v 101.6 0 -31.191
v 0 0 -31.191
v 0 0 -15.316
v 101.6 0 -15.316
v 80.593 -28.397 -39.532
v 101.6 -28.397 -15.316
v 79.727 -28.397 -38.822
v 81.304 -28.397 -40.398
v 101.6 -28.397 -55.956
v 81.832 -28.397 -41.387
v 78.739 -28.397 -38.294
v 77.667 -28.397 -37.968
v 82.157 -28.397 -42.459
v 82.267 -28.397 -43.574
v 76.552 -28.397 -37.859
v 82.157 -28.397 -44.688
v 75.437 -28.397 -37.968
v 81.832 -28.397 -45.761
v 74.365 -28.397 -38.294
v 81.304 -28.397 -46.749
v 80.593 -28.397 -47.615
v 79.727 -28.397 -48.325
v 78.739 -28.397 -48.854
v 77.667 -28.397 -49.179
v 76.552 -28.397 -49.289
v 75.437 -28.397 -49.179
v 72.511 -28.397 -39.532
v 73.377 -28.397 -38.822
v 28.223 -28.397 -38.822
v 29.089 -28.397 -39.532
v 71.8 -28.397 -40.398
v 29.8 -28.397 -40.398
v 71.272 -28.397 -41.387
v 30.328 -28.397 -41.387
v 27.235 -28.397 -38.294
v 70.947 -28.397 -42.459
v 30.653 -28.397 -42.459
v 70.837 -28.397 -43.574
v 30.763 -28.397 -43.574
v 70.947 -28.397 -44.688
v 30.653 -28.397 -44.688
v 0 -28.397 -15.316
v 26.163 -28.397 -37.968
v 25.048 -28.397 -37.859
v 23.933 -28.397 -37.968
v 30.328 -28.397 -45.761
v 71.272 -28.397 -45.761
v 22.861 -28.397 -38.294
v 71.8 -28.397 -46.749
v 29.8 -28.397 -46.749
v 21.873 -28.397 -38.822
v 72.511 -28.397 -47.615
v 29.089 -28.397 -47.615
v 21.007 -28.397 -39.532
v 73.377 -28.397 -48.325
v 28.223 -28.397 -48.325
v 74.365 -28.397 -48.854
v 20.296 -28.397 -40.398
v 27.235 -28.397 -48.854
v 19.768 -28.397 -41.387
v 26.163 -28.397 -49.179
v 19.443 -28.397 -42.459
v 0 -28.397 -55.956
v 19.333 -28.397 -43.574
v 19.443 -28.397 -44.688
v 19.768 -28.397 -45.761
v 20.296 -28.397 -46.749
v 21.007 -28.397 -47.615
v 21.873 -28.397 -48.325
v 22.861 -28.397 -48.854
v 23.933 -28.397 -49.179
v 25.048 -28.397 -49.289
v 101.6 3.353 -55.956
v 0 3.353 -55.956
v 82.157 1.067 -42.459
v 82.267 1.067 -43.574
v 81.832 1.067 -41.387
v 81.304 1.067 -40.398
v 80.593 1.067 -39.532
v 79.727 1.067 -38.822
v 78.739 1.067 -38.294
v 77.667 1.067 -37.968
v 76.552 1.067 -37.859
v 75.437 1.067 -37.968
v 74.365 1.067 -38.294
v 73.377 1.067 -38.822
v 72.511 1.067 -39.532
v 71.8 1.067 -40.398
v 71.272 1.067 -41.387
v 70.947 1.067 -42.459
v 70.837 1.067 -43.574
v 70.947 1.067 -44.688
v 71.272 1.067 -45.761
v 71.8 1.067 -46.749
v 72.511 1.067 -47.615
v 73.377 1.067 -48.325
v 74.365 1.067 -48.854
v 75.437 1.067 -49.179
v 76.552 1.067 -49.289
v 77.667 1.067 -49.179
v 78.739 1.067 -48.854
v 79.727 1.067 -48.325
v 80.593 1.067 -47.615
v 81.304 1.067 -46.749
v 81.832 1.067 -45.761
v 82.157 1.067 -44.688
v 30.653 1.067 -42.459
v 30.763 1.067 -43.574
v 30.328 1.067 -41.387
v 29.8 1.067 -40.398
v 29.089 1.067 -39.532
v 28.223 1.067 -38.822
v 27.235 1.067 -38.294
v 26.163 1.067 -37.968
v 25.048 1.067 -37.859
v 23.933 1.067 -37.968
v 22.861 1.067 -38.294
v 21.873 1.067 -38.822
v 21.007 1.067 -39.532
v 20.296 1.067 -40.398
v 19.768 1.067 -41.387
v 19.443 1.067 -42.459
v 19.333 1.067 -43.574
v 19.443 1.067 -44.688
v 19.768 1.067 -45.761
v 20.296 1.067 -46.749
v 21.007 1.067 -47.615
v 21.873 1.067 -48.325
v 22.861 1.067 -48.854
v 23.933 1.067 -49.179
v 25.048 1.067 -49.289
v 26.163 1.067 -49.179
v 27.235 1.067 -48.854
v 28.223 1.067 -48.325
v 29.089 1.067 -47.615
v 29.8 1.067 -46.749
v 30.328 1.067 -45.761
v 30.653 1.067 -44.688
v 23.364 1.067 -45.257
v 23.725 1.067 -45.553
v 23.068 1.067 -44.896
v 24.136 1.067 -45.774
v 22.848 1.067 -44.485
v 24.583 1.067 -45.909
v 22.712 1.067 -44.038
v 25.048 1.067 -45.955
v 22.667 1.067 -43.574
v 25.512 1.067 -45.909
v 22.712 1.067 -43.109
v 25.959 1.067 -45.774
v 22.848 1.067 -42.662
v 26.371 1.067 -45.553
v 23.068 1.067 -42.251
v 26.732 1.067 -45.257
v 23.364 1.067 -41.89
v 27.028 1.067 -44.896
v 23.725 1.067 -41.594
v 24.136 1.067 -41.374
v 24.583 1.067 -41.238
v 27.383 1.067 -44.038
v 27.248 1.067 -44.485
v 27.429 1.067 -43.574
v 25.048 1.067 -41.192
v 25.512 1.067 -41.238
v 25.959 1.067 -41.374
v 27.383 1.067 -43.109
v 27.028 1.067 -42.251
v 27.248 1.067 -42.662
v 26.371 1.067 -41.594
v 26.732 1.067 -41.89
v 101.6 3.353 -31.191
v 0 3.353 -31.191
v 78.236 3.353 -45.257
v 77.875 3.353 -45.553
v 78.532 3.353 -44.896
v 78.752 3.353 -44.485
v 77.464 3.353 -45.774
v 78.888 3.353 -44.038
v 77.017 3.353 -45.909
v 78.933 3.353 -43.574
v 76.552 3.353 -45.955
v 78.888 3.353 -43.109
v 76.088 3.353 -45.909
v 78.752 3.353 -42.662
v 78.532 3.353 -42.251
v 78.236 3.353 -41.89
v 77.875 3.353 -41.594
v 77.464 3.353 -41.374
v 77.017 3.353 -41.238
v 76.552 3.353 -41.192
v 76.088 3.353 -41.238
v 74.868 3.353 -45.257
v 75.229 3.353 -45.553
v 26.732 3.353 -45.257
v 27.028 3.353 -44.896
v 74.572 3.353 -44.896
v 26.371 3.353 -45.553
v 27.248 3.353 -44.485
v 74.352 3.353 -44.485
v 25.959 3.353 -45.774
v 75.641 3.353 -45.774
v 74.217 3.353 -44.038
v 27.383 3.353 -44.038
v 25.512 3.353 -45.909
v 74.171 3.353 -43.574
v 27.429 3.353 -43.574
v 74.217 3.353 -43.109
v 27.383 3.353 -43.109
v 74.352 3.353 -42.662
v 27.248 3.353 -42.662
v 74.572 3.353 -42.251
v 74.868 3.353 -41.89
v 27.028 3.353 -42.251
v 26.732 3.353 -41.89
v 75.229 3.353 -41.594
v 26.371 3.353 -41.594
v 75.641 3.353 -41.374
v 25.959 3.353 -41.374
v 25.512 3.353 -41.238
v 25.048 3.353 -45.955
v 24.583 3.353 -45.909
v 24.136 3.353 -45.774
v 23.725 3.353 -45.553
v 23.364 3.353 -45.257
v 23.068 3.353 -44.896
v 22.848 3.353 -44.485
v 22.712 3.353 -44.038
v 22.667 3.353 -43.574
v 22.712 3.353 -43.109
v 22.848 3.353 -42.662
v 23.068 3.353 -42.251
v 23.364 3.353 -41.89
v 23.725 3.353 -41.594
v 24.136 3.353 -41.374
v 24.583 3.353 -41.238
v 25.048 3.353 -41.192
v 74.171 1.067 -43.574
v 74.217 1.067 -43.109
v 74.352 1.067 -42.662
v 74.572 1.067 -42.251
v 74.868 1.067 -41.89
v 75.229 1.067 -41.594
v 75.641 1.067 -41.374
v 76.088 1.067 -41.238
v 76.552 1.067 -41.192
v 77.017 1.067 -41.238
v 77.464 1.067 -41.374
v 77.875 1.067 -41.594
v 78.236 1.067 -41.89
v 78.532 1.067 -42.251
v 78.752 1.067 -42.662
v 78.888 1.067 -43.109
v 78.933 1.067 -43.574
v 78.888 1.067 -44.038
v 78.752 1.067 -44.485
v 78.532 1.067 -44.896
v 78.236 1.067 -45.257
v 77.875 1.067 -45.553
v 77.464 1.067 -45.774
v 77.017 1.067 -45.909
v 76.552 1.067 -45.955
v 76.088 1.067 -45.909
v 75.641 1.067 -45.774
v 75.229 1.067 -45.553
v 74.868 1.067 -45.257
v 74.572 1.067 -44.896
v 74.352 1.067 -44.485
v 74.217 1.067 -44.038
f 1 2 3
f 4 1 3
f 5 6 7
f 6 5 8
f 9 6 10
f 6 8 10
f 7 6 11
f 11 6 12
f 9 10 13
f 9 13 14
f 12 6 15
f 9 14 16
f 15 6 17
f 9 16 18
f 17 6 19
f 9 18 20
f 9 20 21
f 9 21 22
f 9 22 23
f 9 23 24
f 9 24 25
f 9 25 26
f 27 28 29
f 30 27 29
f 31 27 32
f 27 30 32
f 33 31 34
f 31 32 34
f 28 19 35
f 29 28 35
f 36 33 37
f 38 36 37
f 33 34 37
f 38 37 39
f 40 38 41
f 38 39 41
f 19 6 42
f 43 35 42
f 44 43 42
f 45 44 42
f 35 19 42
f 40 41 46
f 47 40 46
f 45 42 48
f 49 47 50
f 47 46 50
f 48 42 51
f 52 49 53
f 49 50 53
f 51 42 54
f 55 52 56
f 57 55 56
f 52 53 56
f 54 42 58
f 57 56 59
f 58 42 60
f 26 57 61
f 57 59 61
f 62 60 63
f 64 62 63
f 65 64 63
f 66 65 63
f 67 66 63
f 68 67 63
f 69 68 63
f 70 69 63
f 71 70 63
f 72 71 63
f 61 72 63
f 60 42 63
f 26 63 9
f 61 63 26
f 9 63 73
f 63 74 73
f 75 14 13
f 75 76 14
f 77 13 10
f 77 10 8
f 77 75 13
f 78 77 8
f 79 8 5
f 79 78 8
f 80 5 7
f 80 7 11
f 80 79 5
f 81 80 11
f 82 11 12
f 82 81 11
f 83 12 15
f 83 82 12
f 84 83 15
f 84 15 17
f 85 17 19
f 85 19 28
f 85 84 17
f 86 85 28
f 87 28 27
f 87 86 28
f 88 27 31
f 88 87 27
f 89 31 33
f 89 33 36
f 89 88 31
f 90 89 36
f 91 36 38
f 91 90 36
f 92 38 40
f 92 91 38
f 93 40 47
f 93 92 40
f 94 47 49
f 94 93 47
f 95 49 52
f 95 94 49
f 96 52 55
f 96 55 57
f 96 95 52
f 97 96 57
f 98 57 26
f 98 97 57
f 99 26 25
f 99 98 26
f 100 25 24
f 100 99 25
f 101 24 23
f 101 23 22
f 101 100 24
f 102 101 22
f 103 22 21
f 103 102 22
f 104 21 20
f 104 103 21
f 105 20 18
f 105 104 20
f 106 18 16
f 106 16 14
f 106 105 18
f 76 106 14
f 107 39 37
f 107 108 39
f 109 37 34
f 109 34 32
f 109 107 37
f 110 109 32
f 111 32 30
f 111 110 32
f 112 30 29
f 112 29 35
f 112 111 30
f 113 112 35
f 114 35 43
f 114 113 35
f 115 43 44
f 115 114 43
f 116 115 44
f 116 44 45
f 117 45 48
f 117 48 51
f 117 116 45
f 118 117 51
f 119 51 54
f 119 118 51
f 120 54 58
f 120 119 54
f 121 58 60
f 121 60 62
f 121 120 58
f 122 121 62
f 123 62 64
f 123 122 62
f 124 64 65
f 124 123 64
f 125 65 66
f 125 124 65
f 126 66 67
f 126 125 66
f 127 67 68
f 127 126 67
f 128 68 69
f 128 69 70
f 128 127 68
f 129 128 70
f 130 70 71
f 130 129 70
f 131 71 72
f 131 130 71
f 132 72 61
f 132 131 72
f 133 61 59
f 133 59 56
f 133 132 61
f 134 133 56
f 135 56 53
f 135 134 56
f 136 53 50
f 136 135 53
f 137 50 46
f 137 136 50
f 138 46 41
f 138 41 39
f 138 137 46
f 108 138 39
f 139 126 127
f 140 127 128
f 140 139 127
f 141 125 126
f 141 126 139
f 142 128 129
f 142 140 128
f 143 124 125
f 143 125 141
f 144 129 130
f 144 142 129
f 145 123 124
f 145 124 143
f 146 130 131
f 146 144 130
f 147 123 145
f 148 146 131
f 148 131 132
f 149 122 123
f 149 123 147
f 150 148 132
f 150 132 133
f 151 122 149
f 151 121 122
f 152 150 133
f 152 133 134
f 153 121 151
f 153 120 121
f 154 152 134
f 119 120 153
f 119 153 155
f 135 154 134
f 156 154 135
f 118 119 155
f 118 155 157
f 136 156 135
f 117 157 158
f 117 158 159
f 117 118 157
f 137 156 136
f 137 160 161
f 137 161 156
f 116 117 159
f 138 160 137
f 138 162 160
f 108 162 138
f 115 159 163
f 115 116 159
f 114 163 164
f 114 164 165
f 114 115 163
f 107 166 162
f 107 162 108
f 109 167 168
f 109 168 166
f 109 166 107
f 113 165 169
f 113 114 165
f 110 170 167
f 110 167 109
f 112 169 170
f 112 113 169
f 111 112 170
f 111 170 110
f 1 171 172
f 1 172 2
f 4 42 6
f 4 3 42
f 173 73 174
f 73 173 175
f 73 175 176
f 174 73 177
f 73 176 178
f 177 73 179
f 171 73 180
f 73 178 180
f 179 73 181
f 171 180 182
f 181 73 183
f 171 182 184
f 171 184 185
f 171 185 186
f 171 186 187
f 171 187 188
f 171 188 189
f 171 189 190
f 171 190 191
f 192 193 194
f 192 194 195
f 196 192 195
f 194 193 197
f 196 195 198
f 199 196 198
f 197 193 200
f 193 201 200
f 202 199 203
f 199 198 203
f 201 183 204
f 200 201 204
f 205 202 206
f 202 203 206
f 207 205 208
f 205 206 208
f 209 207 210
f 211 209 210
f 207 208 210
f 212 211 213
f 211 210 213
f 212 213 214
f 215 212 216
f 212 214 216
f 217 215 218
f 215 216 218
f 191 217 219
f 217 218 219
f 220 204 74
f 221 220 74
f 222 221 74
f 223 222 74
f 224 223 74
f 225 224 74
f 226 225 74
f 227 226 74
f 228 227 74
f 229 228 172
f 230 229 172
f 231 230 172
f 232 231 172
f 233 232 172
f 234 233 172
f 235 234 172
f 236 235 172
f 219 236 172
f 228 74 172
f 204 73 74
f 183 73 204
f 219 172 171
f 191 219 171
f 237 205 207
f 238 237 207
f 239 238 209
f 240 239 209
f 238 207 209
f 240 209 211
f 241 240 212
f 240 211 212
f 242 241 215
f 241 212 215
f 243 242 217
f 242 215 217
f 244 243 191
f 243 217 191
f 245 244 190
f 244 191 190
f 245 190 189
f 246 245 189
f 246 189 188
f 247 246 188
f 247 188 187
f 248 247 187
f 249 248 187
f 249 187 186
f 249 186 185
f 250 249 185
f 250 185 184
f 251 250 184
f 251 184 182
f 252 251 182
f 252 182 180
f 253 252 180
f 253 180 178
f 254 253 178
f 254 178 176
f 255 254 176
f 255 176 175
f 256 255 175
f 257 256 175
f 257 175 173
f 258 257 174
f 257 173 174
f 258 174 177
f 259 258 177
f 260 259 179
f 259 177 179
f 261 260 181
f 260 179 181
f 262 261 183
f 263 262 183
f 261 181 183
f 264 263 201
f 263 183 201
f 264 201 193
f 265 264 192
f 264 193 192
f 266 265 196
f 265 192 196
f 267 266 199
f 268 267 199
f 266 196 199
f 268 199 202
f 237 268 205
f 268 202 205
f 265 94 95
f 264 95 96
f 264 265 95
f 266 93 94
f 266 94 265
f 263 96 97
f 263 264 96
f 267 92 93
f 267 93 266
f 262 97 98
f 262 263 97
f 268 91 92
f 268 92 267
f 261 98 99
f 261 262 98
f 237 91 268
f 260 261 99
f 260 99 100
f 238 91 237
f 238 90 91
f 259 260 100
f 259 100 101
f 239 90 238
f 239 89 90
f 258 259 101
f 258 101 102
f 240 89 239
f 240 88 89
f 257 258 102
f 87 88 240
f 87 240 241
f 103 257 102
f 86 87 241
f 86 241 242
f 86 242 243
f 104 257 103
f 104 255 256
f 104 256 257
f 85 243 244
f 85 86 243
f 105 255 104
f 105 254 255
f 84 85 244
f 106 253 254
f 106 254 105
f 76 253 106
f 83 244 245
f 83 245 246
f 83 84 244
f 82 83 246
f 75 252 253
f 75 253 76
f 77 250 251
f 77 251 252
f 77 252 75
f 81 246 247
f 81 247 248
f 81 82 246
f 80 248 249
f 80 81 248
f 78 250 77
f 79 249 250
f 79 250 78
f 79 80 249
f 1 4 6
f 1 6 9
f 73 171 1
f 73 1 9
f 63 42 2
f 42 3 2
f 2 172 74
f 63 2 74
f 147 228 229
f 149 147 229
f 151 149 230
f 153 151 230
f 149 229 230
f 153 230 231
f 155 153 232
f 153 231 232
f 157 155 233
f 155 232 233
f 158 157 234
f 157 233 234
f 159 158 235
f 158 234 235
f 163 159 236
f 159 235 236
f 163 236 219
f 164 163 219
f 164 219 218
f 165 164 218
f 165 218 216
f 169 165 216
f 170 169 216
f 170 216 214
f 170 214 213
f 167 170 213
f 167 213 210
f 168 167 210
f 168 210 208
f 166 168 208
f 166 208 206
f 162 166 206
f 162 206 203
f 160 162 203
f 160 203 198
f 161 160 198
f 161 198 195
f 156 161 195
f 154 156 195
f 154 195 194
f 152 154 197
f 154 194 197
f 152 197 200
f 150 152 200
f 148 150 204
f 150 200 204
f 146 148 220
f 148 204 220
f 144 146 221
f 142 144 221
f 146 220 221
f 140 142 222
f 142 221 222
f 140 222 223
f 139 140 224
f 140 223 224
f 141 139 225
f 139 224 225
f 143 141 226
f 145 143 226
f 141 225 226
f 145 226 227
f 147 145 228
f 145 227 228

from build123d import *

# Parameters (mm, degrees)
F1_DEPTH = 101.6
F2_R     = 2.38125
F3_DEPTH = 6.35
F4_R     = 5.715
F5_DEPTH = 4.064
F6_DEPTH = 25.4
F7_DEPTH = 23.7960387021


with BuildPart() as f1:
    # F0 (on Right) → F1 (new body)
    with BuildSketch(Plane.YZ):
        Polygon((0, -31.1910395777), (0, -15.3160395777), (-2.9972, -15.3160395777), (-2.9972, -55.9560395777), (3.3528, -55.9560395777), (3.3528, -31.1910395777), align=None)
    extrude(amount=F1_DEPTH)

    # F2 (on face) → F3 (cut, through all)
    with BuildSketch(Plane(origin=(0, 3.3528, 0), x_dir=(-1, 0, 0), z_dir=(0, 1, 0))):
        with Locations((-76.5522494912, -43.5735395777)):
            Circle(F2_R)
        with Locations((-25.0477505088, -43.5735395777)):
            Circle(F2_R)
    extrude(amount=-F3_DEPTH, mode=Mode.SUBTRACT)

    # F4 (on face) → F5 (cut)
    with BuildSketch(Plane.XZ.offset(2.9972)):
        with Locations((25.0477505088, -43.5735395777)):
            Circle(F4_R)
        with Locations((76.5522494912, -43.5735395777)):
            Circle(F4_R)
    extrude(amount=-F5_DEPTH, mode=Mode.SUBTRACT)

    # F6 (add): a face of the model
    f6_faces = [f1.faces().sort_by_distance(p)[0] for p in [
        (50.8, -2.9972, -35.2209054991),
    ]]
    extrude(f6_faces, amount=F6_DEPTH)

    # F7 (cut): a face of the model
    f7_faces = [f1.faces().sort_by_distance(p)[0] for p in [
        (50.8, -14.1986, -15.3160395777),
    ]]
    extrude(f7_faces, amount=F7_DEPTH, mode=Mode.SUBTRACT)


solid = f1.part
